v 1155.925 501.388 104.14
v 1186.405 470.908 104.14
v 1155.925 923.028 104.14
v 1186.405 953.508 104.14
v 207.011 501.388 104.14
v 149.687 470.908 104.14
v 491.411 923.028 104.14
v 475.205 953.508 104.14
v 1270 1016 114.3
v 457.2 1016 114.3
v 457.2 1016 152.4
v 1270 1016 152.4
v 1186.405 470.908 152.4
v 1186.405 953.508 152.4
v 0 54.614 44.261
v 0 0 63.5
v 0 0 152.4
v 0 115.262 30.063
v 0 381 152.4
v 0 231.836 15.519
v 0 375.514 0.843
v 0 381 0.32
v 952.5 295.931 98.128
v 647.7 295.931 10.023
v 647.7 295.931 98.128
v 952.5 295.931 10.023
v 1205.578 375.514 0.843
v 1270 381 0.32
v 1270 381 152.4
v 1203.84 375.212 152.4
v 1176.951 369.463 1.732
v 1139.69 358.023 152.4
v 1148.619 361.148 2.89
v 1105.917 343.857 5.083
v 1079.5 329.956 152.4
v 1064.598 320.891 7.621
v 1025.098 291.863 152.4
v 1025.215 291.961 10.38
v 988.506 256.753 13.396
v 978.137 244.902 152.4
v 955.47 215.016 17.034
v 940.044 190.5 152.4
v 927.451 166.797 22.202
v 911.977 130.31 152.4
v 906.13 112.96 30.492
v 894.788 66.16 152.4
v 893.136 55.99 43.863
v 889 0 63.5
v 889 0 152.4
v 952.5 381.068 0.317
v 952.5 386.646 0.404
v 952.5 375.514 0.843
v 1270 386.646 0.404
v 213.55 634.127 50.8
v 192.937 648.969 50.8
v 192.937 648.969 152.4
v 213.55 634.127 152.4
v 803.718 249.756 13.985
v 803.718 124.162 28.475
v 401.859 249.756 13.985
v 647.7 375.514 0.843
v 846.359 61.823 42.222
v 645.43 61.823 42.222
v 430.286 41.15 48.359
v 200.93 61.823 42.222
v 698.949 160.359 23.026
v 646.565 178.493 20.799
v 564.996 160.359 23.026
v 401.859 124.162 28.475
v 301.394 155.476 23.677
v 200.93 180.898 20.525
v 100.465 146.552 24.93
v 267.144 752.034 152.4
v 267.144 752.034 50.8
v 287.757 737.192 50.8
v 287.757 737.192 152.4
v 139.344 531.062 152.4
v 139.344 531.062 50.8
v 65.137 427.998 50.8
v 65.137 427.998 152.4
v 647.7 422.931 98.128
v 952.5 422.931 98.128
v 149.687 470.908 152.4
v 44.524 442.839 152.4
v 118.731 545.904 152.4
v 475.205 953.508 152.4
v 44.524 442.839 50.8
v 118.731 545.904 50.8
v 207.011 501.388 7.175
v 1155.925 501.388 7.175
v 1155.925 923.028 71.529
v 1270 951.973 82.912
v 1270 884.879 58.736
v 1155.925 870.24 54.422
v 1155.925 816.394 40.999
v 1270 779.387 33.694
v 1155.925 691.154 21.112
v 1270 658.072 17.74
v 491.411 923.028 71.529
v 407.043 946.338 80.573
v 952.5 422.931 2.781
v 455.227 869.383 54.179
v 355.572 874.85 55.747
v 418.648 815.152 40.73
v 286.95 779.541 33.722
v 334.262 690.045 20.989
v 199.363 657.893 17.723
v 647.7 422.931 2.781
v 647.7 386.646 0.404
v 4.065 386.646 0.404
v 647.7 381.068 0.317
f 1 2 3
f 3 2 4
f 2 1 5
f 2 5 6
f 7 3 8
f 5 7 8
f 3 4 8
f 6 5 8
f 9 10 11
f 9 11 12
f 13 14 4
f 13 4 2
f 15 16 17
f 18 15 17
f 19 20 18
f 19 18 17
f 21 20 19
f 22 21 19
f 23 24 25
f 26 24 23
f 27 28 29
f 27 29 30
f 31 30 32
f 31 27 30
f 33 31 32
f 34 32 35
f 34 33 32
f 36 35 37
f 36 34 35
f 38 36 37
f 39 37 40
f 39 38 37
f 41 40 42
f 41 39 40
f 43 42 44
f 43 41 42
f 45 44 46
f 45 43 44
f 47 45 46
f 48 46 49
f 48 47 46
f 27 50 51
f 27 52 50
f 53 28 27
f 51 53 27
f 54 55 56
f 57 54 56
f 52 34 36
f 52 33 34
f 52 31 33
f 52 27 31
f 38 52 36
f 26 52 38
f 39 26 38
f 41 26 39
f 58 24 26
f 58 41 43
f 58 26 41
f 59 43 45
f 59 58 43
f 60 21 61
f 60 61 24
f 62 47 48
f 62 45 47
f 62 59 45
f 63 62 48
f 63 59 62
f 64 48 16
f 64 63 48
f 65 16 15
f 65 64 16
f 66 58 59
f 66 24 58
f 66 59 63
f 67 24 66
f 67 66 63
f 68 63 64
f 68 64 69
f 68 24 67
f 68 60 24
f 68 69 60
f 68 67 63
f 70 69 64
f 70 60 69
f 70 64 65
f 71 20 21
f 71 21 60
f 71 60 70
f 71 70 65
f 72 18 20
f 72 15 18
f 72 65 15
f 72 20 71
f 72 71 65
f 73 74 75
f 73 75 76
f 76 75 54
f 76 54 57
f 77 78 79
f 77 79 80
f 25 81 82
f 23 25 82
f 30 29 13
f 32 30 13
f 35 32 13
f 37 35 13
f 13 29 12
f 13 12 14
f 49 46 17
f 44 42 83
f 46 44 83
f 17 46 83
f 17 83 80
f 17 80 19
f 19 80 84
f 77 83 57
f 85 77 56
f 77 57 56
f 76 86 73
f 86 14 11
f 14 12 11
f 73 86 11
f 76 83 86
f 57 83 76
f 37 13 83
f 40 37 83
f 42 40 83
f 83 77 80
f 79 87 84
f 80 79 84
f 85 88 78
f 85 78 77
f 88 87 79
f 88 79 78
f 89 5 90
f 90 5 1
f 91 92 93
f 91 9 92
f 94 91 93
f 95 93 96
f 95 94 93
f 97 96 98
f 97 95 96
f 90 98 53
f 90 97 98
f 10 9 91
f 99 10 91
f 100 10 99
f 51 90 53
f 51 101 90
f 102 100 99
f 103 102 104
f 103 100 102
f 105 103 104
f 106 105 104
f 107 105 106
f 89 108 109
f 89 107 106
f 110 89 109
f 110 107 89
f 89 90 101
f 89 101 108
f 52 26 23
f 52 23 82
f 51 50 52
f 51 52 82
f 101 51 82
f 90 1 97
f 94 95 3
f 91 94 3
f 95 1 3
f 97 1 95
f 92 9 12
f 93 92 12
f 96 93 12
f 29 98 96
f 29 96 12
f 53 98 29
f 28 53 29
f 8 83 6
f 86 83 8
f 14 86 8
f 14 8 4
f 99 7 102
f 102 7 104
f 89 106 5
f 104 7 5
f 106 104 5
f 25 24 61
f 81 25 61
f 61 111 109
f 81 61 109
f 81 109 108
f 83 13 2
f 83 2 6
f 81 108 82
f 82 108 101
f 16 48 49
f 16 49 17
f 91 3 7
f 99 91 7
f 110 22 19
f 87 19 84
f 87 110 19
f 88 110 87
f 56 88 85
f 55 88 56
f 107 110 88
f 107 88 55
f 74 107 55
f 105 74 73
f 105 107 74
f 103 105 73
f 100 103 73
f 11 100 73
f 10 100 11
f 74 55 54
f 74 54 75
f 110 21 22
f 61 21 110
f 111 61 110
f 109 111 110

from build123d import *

# Parameters (mm, degrees)
BOSS_EXTRUDE1_DEPTH     = 152.4
CUT_EXTRUDE1_DEPTH      = 1634.518215387
CUT_EXTRUDE1_DEPTH_BACK = 1634.518215387
CUT_EXTRUDE2_DEPTH      = 1634.518215536
FILLET1_R               = 50.8
CUT_EXTRUDE3_DEPTH      = 48.26
CUT_EXTRUDE4_DEPTH      = 1213.010253568
SKETCH6_W               = 101.6
SKETCH6_H               = 127
CUT_EXTRUDE5_DEPTH      = 25.4
LPATTERN1_COUNT         = 2
LPATTERN1_PITCH         = 254
SKETCH7_W               = 304.8
SKETCH7_H               = 127
CUT_EXTRUDE7_DEPTH      = 114.3


with BuildPart() as part:
    # Sketch1 → Boss-Extrude1 (new body)
    with BuildSketch(Plane.XY):
        with BuildLine():
            Line((0, 0), (0, 381))
            Line((0, 381), (457.2, 1016))
            Line((457.2, 1016), (1270, 1016))
            Line((1270, 1016), (1270, 381))
            ThreePointArc((1270, 381), (1000.592316368, 269.407683632), (889, 0))
            Line((889, 0), (0, 0))
        make_face()
    extrude(amount=BOSS_EXTRUDE1_DEPTH)

    # Sketch3 → Cut-Extrude1 (cut, two sides: drawn at the far end of the back side and taken through both)
    with BuildSketch(Plane(origin=(1270, 0, 0), x_dir=(0, 0, -1), z_dir=(1, 0, 0)).offset(-CUT_EXTRUDE1_DEPTH_BACK)):
        with BuildLine():
            Line((0, 1016), (-114.3, 1016))
            add(Edge.make_bspline(
                [(-114.3, 1016), (-8.40924149, 829.104015067), (-15.870449407, 600.128785321), (0, 381)],
                knots=[0, 0, 0, 0, 1, 1, 1, 1], degree=3))
            Line((0, 381), (0, 1016))
        make_face()
    extrude(amount=CUT_EXTRUDE1_DEPTH + CUT_EXTRUDE1_DEPTH_BACK, mode=Mode.SUBTRACT)

    # Sketch4 → Cut-Extrude2 (cut, through all)
    with BuildSketch(Plane.ZY):
        with BuildLine():
            Line((0, 0), (63.5, 0))
            add(Edge.make_bspline(
                [(0, 381), (19.94820776, 253.802921476), (11.059212426, 124.818838522), (63.5, 0)],
                knots=[0, 0, 0, 0, 1, 1, 1, 1], degree=3))
            Line((0, 381), (0, 0))
        make_face()
    extrude(amount=-CUT_EXTRUDE2_DEPTH, mode=Mode.SUBTRACT)

    # Fillet1
    fillet1_edges = [part.edges().sort_by_distance(p)[0] for p in [
        (635, 381, 0),
    ]]
    fillet(fillet1_edges, radius=FILLET1_R)

    # Sketch5 → Cut-Extrude3 (cut)
    with BuildSketch(Plane.XY.offset(152.4)):
        Polygon((1186.404527601, 953.507993358), (1186.404527601, 470.907993358), (149.686717373, 470.907993358), (475.204527601, 953.507993358), align=None)
    extrude(amount=-CUT_EXTRUDE3_DEPTH, mode=Mode.SUBTRACT)

    # 3DSketch1 → Cut-Extrude4 (cut, through all)
    with BuildSketch(Plane(origin=(491.411031078, 923.027993358, 104.14), x_dir=(0.8443699387246085, -0.535760586995909, 0), z_dir=(0, 0, -1))):
        Polygon((0, 0), (-14.240523347, 508.390329239), (786.993314242, 0), (561.095220341, -356.020140964), align=None)
    extrude(amount=CUT_EXTRUDE4_DEPTH, mode=Mode.SUBTRACT)

    # Sketch6 → Cut-Extrude5 (cut)
    with BuildSketch(Plane(origin=(-180.663856691, 130.077976818, 0), x_dir=(0, 0, 1), z_dir=(-0.8115343414514944, 0.5843047258450759, 0))):
        with Locations((101.6, 448.894584093)):
            Rectangle(SKETCH6_W, SKETCH6_H)
    cut_extrude5 = extrude(amount=-CUT_EXTRUDE5_DEPTH, mode=Mode.SUBTRACT)

    # LPattern1: Cut-Extrude5 ×2
    with Locations(*[Vector(0.5843047258450758, 0.8115343414514946, 0) * (i * LPATTERN1_PITCH) for i in range(1, LPATTERN1_COUNT)]):
        add(cut_extrude5, mode=Mode.SUBTRACT)

    # Sketch7 → Cut-Extrude7 (cut)
    with BuildSketch(Plane.XY.offset(-16.17222699)):
        with Locations((800.1, 359.431211457)):
            Rectangle(SKETCH7_W, SKETCH7_H)
    extrude(amount=CUT_EXTRUDE7_DEPTH, mode=Mode.SUBTRACT)


solid = part.part
